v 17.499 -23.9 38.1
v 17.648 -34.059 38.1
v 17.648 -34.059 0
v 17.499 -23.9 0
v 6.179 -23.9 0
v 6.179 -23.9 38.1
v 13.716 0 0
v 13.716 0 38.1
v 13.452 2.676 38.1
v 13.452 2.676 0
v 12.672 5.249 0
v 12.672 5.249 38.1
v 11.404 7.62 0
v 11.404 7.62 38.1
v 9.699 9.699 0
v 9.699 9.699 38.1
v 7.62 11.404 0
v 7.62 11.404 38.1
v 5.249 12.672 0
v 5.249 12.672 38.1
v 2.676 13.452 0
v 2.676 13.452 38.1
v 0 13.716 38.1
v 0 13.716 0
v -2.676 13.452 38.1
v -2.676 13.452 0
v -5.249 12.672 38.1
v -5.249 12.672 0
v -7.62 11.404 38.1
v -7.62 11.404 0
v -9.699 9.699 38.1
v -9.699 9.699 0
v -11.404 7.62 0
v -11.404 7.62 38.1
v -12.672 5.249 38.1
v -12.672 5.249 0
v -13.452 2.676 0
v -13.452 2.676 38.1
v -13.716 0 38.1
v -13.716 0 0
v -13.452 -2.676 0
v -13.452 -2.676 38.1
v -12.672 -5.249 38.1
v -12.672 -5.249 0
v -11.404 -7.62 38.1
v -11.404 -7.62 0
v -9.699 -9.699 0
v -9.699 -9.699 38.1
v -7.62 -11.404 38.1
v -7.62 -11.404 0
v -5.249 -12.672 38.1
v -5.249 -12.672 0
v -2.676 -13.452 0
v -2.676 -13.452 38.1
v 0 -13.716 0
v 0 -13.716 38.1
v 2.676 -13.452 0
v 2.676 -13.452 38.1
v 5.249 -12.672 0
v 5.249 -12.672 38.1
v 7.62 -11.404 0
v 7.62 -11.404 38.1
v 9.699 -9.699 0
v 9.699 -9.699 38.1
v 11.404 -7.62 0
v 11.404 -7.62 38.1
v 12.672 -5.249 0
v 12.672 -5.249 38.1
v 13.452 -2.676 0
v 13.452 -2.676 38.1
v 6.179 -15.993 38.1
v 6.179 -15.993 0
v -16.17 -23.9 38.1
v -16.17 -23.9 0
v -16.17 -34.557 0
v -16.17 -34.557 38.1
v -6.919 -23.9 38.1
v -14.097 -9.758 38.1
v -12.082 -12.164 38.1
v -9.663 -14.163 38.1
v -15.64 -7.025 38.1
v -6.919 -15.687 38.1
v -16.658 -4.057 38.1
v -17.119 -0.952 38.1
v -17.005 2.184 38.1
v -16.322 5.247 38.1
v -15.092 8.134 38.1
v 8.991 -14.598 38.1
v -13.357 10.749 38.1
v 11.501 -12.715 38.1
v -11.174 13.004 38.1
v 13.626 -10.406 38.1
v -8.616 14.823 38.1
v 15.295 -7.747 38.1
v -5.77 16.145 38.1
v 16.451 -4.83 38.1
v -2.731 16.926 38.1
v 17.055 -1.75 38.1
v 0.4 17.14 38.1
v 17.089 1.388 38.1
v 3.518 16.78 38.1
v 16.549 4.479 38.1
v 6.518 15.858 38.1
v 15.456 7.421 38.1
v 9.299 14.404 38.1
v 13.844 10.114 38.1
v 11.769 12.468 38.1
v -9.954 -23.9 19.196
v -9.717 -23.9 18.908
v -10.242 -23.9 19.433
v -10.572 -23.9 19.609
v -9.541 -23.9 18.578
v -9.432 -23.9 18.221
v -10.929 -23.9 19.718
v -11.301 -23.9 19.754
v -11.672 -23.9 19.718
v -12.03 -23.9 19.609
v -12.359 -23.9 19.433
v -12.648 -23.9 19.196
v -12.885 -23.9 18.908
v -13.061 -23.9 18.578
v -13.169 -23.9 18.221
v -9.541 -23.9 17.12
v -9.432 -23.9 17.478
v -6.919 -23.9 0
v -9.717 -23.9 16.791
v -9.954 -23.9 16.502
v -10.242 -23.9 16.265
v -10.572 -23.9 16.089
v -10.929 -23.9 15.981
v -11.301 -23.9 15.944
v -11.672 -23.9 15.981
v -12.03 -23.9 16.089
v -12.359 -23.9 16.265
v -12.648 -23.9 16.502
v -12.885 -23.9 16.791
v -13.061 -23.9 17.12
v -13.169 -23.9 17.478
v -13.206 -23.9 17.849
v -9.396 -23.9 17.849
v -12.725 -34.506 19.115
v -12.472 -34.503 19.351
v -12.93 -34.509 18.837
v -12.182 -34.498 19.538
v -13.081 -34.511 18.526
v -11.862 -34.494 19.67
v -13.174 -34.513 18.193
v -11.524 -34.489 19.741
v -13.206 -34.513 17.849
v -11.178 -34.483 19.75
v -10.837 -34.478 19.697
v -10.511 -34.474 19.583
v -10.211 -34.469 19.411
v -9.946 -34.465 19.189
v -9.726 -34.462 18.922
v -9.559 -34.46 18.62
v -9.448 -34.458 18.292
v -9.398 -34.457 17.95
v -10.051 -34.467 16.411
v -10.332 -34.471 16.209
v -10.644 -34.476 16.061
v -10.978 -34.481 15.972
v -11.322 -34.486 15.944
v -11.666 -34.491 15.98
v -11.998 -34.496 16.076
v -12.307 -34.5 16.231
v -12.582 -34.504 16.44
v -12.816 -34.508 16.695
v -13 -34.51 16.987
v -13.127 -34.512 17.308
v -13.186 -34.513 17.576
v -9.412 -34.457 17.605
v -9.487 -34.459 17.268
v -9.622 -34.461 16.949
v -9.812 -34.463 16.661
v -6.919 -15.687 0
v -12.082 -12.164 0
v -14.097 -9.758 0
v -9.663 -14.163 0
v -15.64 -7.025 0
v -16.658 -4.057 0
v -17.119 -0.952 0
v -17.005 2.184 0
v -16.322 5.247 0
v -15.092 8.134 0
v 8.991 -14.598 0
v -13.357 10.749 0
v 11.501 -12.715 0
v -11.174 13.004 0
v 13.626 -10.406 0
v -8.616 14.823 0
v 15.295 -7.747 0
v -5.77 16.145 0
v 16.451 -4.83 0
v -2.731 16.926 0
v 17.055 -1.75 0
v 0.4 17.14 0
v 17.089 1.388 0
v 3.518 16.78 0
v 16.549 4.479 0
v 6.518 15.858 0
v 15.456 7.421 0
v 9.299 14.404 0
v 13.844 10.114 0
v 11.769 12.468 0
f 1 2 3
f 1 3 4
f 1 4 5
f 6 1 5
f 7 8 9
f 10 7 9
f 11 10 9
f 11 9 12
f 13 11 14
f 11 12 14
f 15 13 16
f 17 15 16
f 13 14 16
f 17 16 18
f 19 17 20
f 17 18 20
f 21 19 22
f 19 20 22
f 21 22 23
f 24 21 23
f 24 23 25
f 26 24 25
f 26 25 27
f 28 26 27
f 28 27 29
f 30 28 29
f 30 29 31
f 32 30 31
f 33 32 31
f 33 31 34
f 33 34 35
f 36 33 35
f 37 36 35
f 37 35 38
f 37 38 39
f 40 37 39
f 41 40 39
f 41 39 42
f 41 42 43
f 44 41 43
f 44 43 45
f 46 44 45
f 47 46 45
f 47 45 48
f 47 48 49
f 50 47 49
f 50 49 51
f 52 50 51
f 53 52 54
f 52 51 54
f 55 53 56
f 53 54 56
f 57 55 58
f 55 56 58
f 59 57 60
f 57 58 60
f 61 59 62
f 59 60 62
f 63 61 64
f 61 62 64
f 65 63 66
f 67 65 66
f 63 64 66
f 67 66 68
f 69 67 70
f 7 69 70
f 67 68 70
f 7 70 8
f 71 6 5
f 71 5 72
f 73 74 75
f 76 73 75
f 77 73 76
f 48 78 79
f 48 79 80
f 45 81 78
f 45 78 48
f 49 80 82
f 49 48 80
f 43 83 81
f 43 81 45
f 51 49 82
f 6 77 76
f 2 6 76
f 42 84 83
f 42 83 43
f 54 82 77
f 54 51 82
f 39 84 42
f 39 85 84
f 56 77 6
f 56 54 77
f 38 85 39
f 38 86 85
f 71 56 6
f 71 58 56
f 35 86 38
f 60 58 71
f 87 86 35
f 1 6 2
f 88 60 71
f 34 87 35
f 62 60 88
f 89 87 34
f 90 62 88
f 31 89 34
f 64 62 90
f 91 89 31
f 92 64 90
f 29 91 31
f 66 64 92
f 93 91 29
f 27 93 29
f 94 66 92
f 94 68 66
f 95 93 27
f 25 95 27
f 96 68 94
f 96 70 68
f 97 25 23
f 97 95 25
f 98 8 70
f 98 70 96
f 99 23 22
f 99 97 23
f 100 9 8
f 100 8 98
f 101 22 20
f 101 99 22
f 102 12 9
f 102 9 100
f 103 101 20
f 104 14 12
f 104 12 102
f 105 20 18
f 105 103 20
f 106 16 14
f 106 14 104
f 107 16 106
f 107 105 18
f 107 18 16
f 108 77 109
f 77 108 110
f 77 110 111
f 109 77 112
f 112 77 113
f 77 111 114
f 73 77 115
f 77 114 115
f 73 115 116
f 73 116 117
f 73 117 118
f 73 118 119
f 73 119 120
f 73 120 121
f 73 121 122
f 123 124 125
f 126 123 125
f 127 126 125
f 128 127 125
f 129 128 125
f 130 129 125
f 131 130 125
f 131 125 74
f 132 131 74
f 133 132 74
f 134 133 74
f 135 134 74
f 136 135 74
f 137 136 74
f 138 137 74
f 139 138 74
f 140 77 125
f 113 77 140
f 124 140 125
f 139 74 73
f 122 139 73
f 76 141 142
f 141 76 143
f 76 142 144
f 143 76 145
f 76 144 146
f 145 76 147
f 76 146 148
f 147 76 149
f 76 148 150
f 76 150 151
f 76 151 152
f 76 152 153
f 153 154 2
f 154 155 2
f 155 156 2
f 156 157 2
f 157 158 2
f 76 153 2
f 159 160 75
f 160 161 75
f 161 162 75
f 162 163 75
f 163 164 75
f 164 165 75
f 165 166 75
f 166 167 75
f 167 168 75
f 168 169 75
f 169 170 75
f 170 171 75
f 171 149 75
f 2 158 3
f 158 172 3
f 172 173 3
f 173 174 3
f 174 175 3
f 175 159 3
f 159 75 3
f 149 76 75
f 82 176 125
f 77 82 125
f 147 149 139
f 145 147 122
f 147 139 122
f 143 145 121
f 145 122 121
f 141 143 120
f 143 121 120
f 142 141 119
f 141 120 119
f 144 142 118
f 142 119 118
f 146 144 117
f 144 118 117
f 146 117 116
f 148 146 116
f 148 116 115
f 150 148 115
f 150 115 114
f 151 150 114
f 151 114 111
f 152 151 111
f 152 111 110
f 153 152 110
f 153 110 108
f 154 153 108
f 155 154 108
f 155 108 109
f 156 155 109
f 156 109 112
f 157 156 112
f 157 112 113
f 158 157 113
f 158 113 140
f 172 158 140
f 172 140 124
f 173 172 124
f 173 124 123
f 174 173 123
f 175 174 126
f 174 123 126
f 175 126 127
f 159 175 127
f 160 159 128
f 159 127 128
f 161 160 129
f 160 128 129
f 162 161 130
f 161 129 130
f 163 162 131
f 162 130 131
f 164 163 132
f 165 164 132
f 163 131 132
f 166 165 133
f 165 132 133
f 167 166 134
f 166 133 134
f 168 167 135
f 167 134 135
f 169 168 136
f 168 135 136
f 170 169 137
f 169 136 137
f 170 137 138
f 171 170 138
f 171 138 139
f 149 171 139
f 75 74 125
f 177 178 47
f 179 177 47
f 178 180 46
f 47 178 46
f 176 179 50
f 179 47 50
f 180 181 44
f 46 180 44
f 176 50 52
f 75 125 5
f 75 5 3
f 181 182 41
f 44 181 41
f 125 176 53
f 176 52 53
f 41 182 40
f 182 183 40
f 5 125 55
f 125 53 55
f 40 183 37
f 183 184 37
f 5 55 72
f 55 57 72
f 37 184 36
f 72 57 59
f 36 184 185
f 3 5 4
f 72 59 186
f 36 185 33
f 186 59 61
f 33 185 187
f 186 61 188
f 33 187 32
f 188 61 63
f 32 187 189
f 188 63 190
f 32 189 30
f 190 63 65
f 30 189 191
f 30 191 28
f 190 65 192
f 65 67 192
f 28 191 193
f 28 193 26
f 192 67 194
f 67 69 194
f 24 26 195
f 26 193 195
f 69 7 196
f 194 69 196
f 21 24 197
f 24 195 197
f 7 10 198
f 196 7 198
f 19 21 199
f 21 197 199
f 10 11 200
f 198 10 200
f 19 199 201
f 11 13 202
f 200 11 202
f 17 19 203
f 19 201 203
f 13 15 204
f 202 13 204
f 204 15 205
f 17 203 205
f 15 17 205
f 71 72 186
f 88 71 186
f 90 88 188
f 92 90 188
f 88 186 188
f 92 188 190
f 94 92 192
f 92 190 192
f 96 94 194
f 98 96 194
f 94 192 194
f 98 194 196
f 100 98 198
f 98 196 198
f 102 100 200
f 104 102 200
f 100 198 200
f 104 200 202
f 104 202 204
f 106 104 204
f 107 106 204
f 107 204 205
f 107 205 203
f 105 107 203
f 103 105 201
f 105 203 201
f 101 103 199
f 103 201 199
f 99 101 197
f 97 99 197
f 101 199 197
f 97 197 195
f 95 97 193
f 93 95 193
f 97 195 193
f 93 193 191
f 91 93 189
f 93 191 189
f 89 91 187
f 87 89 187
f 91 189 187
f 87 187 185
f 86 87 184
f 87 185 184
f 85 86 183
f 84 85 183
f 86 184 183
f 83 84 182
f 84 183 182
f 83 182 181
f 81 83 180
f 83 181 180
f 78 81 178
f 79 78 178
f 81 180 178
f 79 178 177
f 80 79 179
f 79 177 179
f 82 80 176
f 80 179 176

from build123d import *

# Parameters (mm, degrees)
F1_DEPTH = 38.1
F2_R     = 13.716
F3_DEPTH = 50.292
F4_R     = 1.905
F5_DEPTH = 25.4


# Not quite as in the source:
# - a feature names something its author has since deleted; it is built from what else it names


with BuildPart() as f1:
    # F0 (on Top) → F1 (new body)
    with BuildSketch(Plane.XY):
        with BuildLine():
            ThreePointArc((6.1794301228, -15.9926754597), (14.1403209733, -9.6954807912), (17.145, 0))
            ThreePointArc((17.145, 0), (-9.3627294025, 14.3628104191), (-6.9191963412, -15.6868016814))
            ThreePointArc((-6.9191963412, -15.6868016814), (-0.4002539276, -17.1403273537), (6.1794301228, -15.9926754597))
        make_face()
        with BuildLine():
            ThreePointArc((6.1794301228, -15.9926754597), (-0.4002539276, -17.1403273537), (-6.9191963412, -15.6868016814))
            Line((-6.9191963412, -15.6868016814), (-6.9191963412, -23.9002238959))
            Line((-6.9191963412, -23.9002238959), (-16.1695149392, -23.9002238959))
            Line((-16.1695149392, -23.9002238959), (-16.1695149392, -34.5569381251))
            Line((-16.1695149392, -34.5569381251), (17.6482256417, -34.0591232702))
            Line((17.6482256417, -34.0591232702), (17.4986813217, -23.9002238959))
            Line((17.4986813217, -23.9002238959), (6.1794301228, -23.9002238959))
            Line((6.1794301228, -23.9002238959), (6.1794301228, -21.5747152004))
            Line((6.1794301228, -21.5747152004), (6.1794301228, -15.9926754597))
        make_face()
    extrude(amount=F1_DEPTH)

    # F2 (on face) → F3 (cut)
    with BuildSketch(Plane.XY.offset(38.1)):
        Circle(F2_R)
    extrude(amount=-F3_DEPTH, mode=Mode.SUBTRACT)

    # F4 (on face) → F5 (cut)
    with BuildSketch(Plane(origin=(0, -23.9002238959, 0), x_dir=(-1, 0, 0), z_dir=(0, 1, 0))):
        with Locations((11.3007957116, 17.8492013365)):
            Circle(F4_R)
    extrude(amount=-F5_DEPTH, mode=Mode.SUBTRACT)


solid = f1.part
